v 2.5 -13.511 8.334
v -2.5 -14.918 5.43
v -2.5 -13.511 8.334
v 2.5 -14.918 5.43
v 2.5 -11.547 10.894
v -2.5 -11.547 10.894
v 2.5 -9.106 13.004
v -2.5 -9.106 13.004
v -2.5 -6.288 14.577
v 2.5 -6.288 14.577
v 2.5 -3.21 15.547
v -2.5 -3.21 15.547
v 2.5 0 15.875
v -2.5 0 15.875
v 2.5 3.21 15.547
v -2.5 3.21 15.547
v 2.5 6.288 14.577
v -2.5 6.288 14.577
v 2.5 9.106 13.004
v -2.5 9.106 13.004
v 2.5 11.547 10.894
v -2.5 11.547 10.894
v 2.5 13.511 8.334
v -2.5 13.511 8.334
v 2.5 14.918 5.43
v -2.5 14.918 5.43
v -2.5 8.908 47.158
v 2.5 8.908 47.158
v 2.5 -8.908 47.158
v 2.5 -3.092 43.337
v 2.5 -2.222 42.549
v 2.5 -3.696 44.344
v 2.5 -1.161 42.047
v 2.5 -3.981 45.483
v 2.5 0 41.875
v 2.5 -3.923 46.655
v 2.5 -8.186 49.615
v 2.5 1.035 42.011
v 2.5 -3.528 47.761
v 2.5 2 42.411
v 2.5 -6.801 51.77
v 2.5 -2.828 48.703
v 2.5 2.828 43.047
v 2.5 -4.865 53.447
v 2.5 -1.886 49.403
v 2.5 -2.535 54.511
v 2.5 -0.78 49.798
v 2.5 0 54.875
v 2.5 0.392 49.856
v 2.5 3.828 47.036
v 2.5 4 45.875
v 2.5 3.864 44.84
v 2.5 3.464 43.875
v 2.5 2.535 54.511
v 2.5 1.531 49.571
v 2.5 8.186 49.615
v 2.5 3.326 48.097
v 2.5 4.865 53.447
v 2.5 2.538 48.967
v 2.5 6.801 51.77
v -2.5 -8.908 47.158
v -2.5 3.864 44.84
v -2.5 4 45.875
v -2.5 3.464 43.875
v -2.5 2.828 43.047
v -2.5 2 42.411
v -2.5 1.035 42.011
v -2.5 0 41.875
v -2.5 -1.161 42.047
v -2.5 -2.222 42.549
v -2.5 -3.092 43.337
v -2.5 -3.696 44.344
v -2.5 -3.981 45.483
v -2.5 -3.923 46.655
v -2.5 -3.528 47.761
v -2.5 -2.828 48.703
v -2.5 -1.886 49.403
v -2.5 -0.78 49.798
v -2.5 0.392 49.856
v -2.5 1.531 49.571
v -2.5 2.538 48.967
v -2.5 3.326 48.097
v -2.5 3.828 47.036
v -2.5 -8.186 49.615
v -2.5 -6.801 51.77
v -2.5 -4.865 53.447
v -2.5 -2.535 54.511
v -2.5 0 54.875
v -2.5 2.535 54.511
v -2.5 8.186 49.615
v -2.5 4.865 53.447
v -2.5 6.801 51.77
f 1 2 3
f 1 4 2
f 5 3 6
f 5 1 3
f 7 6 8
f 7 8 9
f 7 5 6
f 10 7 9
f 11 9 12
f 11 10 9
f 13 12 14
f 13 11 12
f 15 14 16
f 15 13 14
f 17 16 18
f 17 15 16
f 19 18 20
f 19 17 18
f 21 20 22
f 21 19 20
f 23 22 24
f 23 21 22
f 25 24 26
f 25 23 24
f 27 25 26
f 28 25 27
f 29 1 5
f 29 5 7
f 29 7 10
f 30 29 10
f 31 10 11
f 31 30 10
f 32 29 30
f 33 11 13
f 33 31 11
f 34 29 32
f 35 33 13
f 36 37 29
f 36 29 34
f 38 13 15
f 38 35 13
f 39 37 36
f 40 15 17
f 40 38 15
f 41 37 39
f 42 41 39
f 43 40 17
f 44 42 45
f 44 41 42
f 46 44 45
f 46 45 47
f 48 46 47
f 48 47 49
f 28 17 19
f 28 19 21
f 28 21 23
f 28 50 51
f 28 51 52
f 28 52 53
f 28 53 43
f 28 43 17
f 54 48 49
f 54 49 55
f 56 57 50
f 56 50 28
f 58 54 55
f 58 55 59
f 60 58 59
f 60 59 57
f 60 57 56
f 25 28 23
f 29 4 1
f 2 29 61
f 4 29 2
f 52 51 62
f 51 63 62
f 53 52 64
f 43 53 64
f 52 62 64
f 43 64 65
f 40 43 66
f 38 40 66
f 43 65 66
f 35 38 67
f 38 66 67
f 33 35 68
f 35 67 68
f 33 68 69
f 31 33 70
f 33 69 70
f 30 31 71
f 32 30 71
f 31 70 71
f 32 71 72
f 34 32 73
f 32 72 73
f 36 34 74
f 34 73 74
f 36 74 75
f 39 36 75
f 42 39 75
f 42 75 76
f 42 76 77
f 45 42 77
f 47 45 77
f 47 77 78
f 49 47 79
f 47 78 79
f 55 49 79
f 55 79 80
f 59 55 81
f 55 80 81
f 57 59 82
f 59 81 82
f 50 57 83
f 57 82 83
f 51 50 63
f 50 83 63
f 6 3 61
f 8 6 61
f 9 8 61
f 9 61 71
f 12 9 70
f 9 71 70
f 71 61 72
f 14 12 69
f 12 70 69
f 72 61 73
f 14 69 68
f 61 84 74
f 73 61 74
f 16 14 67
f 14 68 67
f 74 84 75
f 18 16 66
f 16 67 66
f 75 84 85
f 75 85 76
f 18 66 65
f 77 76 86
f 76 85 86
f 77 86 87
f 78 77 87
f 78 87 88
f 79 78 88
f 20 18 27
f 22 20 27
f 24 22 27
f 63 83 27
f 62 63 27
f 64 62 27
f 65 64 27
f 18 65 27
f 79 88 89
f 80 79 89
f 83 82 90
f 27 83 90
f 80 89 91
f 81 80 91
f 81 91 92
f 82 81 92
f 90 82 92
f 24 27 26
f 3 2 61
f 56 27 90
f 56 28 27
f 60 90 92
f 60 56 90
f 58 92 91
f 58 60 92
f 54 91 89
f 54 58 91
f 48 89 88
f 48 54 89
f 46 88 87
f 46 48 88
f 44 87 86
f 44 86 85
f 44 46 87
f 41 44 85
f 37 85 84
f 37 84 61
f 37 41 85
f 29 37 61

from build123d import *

# Parameters (mm, degrees)
BOSS_EXTRUDE1_DEPTH = 2.5


with BuildPart() as part:
    # Sketch1 → Boss-Extrude1 (new, symmetric)
    with BuildSketch(Plane.YZ):
        with BuildLine():
            ThreePointArc((-14.917620355, 5.429569775), (-9.105525927, 13.004038703), (0, 15.875))
            ThreePointArc((0, 15.875), (9.105525927, 13.004038703), (14.917620355, 5.429569775))
            Line((14.917620355, 5.429569775), (8.908095127, 47.157903431))
            ThreePointArc((8.908095127, 47.157903431), (0, 54.875), (-8.908095127, 47.157903431))
            Line((-8.908095127, 47.157903431), (-14.917620355, 5.429569775))
        make_face()
        with BuildLine():
            ThreePointArc((4, 45.875), (2.828427125, 43.046572875), (0, 41.875))
            ThreePointArc((0, 41.875), (-2.828427125, 48.703427125), (4, 45.875))
        make_face(mode=Mode.SUBTRACT)
    extrude(amount=BOSS_EXTRUDE1_DEPTH, both=True)


solid = part.part
